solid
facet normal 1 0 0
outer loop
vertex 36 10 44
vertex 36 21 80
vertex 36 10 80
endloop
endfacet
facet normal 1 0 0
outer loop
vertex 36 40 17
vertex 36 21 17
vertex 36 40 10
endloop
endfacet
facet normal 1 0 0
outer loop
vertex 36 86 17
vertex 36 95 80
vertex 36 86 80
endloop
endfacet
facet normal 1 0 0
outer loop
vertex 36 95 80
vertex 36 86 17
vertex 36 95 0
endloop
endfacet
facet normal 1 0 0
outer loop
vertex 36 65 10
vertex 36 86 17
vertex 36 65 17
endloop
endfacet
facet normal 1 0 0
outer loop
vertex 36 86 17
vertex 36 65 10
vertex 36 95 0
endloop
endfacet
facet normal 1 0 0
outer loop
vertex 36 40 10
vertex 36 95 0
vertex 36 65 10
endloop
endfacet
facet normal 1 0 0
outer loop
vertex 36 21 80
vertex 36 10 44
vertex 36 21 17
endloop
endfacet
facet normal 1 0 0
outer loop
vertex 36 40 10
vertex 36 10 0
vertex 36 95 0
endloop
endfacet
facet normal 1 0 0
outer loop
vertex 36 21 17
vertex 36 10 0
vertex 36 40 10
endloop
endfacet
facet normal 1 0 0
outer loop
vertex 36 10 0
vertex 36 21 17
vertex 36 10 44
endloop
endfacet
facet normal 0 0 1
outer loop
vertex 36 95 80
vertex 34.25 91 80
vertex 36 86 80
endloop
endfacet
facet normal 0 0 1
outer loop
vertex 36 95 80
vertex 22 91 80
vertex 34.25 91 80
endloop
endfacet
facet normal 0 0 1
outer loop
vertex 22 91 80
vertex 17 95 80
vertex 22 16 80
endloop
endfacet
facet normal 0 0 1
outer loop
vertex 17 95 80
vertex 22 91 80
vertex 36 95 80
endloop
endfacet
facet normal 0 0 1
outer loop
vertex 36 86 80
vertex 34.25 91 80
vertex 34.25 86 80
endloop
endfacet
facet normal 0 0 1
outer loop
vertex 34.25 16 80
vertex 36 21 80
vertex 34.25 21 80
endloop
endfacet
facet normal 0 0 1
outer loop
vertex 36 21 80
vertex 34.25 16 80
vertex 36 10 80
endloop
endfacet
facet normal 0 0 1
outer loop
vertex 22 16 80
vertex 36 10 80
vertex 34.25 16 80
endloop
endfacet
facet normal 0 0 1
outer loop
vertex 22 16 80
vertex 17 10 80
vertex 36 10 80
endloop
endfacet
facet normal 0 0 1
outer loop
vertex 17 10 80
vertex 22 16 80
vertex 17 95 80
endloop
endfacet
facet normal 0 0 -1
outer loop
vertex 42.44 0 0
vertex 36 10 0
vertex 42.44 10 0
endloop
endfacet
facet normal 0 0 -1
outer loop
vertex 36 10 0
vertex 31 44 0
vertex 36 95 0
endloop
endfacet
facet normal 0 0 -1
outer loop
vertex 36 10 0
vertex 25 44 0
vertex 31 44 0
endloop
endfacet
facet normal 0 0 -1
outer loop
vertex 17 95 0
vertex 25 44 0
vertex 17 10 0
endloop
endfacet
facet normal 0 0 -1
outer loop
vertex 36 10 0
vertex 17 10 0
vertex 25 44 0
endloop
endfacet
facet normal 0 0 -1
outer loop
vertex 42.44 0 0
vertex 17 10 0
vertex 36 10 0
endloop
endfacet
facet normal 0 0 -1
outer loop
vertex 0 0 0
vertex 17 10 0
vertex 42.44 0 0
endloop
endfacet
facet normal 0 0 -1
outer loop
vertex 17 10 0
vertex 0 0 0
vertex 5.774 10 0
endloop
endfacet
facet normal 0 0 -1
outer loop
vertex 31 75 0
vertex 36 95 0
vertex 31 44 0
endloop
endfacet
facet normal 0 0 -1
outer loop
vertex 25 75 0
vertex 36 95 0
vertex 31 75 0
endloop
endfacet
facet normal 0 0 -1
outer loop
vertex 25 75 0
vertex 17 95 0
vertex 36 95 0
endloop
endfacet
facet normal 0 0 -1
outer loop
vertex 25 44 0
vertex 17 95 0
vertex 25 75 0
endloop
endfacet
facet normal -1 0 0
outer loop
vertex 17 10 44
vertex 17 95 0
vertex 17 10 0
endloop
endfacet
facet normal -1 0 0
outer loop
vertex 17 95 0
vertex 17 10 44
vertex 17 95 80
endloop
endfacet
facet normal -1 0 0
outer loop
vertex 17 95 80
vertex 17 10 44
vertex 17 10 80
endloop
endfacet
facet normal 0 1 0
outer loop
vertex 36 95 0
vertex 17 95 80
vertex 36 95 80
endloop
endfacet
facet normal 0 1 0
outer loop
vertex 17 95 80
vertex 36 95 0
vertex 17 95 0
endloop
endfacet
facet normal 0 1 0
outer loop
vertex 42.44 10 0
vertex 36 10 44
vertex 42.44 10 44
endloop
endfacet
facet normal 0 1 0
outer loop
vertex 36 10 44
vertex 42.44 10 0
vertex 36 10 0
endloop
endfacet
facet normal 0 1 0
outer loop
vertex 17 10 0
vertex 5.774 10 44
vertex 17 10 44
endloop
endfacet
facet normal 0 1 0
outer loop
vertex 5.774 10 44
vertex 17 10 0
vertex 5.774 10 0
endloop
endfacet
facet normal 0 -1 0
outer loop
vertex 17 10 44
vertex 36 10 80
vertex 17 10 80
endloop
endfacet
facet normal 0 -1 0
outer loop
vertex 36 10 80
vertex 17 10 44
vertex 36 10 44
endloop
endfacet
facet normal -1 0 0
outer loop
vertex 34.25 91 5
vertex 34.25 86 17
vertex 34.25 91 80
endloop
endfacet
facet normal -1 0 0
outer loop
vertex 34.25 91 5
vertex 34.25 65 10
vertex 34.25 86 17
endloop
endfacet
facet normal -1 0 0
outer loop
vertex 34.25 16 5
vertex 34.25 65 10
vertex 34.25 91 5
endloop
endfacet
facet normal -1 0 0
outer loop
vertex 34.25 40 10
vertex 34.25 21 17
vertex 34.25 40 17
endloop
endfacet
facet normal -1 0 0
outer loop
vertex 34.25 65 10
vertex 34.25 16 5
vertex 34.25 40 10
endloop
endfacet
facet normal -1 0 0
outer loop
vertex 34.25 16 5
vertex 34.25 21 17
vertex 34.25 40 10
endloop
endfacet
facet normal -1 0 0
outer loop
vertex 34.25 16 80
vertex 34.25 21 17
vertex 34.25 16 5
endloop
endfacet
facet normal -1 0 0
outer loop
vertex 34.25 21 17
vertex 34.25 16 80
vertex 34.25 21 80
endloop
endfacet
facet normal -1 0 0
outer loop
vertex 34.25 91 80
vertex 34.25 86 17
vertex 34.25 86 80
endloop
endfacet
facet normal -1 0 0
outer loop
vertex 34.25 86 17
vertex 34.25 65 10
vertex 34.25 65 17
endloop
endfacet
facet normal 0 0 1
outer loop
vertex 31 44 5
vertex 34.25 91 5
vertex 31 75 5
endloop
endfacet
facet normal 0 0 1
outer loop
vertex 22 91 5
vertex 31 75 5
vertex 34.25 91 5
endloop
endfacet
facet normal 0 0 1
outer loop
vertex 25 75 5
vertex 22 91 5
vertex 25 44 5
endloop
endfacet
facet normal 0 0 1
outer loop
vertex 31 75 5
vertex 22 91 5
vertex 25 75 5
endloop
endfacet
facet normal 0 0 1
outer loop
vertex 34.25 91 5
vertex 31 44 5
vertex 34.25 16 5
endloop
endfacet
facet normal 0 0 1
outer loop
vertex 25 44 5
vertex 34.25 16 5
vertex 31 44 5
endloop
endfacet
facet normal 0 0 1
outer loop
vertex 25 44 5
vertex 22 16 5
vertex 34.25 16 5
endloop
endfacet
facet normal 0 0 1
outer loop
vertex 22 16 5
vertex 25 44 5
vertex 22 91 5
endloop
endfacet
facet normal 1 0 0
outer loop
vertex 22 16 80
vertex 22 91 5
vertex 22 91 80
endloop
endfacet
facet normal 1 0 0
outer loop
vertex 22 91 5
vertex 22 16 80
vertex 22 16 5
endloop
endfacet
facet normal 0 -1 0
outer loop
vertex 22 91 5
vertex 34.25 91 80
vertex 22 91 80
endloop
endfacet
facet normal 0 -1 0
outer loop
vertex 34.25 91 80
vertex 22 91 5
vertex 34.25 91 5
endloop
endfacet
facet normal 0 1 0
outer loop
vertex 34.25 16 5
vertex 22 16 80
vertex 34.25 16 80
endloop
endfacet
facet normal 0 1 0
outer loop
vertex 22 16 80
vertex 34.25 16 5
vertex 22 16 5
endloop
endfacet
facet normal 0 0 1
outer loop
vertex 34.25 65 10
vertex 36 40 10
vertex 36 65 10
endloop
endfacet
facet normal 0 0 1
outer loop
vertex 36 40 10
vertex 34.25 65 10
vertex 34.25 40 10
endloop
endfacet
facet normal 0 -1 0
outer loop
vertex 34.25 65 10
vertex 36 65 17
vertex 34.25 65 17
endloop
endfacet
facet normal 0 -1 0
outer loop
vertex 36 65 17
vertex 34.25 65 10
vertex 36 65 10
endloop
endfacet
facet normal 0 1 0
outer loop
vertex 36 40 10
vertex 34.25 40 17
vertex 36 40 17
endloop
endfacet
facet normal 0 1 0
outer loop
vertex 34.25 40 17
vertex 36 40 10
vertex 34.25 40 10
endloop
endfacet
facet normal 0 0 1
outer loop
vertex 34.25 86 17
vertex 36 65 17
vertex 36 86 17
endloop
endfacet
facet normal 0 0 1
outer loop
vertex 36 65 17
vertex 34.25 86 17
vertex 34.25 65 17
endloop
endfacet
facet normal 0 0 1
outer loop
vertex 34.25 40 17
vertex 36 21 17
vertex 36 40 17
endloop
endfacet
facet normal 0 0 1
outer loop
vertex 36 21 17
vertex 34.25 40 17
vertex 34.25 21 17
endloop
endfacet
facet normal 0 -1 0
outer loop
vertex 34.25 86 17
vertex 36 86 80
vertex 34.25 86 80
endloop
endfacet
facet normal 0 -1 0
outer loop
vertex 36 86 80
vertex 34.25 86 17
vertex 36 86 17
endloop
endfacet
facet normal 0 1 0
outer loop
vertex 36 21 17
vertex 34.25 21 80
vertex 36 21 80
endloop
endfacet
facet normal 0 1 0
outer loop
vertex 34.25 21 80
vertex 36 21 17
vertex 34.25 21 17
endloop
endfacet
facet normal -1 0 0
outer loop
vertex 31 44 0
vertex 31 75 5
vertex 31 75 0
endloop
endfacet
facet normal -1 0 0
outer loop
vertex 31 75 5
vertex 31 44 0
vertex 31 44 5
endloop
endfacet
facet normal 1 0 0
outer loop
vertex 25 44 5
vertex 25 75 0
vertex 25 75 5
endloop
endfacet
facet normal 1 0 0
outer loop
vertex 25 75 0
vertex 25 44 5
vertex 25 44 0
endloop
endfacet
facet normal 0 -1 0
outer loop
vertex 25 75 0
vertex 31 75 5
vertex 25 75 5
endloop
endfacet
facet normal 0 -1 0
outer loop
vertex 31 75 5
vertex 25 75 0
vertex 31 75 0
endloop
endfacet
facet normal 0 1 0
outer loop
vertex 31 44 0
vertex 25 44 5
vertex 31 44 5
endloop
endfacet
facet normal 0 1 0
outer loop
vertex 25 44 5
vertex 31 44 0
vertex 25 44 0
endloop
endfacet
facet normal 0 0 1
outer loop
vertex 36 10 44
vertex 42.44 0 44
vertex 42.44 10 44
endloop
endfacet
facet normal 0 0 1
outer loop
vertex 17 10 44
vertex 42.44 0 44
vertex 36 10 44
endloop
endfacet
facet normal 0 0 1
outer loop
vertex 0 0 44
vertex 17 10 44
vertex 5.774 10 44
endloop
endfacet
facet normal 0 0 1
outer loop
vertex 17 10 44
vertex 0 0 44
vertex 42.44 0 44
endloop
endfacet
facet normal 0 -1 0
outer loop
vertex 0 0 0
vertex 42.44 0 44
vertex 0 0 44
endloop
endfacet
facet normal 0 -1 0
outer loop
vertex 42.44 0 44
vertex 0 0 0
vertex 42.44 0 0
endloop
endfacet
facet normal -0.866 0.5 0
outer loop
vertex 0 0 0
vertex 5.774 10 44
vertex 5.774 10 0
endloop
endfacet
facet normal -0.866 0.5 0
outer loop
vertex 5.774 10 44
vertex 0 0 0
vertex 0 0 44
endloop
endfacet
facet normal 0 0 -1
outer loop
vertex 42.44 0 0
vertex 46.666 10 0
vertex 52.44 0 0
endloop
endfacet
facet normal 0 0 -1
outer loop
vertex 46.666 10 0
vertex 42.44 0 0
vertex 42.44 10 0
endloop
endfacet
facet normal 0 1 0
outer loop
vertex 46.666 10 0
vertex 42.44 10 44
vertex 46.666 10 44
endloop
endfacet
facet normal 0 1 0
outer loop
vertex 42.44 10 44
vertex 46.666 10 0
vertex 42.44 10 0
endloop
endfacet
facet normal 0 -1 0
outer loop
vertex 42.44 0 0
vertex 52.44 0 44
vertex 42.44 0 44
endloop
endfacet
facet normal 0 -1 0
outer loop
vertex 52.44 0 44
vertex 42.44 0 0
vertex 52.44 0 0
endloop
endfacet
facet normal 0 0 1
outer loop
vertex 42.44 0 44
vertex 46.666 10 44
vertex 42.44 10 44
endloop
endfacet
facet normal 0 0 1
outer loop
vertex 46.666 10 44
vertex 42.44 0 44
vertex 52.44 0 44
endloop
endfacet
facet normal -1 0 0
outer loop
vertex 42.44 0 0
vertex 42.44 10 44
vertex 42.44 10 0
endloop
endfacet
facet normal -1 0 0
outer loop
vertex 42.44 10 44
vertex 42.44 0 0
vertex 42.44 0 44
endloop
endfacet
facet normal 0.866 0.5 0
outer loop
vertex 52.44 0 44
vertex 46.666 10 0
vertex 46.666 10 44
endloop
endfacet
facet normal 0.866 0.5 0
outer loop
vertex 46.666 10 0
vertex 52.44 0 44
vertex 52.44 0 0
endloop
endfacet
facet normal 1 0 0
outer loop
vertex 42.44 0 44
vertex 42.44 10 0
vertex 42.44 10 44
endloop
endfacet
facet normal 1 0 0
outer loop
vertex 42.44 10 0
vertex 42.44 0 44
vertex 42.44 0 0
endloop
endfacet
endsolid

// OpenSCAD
union() {
    translate([17,10,0]) {
        phone_holder();
    }
    rotate([0,0,-90]) {
        translate([-10, 0, 0]) {
            tripod_attachment();
        }
    }
}

module phone_holder() {
    difference() {
        cube([19, 85, 80]);
        translate([5,6,5]) {
            cube([12.25,75,80]);
        }
        // start button
        translate([10,30,10]) {
            cube([15,25,80]);
        }
        // screen
        translate([10,11,17]) {
            cube([15,65,80]);
        }
        
        // mic and micro usb
        translate([8,34,0]) {
            cube([6,31,10]);
        }

    }
    
    
}



module tripod_attachment() {
    translate([10,0,0]) {
        rotate([0,-90,0]) {
            difference() {
                body();
                /*
                translate([44/2, 51.44/2, -1]) {
                    cylinder(r=6.4/2, h=12, $fn=32);
                    cylinder(r=6.5/2, h=8, $fn=32);        
                    cylinder(r=12.9/2, h=5, $fn=6);
                }
                */
            }
        }
    }
}

/*
translate([9,51.44/2-5.5,20]) {
    color("red") cube([1,11,3]);
}

translate([12,0,0]) {
    cube([1,52.44,1]);
}
 
translate([0,53,0]) {
    cube([44,1,1]);
}
*/
   
module ramp() {
    difference() {
        cube([44,10,10]);
        translate([0,0,0]) {
            rotate([60,0,0]) {
                cube([55.44,15,10]);
            }
        }
     }
}

module body() {
    union() {    
        translate([0,10,0]) {
            cube([44, 32.44, 10]);
        }
        
        translate([0, 0, 0]) {  
           ramp();
        }
        translate([44,32.44+20,0]) {
            rotate([0,0,180]) {
                ramp();
            }
        }
    }
}
